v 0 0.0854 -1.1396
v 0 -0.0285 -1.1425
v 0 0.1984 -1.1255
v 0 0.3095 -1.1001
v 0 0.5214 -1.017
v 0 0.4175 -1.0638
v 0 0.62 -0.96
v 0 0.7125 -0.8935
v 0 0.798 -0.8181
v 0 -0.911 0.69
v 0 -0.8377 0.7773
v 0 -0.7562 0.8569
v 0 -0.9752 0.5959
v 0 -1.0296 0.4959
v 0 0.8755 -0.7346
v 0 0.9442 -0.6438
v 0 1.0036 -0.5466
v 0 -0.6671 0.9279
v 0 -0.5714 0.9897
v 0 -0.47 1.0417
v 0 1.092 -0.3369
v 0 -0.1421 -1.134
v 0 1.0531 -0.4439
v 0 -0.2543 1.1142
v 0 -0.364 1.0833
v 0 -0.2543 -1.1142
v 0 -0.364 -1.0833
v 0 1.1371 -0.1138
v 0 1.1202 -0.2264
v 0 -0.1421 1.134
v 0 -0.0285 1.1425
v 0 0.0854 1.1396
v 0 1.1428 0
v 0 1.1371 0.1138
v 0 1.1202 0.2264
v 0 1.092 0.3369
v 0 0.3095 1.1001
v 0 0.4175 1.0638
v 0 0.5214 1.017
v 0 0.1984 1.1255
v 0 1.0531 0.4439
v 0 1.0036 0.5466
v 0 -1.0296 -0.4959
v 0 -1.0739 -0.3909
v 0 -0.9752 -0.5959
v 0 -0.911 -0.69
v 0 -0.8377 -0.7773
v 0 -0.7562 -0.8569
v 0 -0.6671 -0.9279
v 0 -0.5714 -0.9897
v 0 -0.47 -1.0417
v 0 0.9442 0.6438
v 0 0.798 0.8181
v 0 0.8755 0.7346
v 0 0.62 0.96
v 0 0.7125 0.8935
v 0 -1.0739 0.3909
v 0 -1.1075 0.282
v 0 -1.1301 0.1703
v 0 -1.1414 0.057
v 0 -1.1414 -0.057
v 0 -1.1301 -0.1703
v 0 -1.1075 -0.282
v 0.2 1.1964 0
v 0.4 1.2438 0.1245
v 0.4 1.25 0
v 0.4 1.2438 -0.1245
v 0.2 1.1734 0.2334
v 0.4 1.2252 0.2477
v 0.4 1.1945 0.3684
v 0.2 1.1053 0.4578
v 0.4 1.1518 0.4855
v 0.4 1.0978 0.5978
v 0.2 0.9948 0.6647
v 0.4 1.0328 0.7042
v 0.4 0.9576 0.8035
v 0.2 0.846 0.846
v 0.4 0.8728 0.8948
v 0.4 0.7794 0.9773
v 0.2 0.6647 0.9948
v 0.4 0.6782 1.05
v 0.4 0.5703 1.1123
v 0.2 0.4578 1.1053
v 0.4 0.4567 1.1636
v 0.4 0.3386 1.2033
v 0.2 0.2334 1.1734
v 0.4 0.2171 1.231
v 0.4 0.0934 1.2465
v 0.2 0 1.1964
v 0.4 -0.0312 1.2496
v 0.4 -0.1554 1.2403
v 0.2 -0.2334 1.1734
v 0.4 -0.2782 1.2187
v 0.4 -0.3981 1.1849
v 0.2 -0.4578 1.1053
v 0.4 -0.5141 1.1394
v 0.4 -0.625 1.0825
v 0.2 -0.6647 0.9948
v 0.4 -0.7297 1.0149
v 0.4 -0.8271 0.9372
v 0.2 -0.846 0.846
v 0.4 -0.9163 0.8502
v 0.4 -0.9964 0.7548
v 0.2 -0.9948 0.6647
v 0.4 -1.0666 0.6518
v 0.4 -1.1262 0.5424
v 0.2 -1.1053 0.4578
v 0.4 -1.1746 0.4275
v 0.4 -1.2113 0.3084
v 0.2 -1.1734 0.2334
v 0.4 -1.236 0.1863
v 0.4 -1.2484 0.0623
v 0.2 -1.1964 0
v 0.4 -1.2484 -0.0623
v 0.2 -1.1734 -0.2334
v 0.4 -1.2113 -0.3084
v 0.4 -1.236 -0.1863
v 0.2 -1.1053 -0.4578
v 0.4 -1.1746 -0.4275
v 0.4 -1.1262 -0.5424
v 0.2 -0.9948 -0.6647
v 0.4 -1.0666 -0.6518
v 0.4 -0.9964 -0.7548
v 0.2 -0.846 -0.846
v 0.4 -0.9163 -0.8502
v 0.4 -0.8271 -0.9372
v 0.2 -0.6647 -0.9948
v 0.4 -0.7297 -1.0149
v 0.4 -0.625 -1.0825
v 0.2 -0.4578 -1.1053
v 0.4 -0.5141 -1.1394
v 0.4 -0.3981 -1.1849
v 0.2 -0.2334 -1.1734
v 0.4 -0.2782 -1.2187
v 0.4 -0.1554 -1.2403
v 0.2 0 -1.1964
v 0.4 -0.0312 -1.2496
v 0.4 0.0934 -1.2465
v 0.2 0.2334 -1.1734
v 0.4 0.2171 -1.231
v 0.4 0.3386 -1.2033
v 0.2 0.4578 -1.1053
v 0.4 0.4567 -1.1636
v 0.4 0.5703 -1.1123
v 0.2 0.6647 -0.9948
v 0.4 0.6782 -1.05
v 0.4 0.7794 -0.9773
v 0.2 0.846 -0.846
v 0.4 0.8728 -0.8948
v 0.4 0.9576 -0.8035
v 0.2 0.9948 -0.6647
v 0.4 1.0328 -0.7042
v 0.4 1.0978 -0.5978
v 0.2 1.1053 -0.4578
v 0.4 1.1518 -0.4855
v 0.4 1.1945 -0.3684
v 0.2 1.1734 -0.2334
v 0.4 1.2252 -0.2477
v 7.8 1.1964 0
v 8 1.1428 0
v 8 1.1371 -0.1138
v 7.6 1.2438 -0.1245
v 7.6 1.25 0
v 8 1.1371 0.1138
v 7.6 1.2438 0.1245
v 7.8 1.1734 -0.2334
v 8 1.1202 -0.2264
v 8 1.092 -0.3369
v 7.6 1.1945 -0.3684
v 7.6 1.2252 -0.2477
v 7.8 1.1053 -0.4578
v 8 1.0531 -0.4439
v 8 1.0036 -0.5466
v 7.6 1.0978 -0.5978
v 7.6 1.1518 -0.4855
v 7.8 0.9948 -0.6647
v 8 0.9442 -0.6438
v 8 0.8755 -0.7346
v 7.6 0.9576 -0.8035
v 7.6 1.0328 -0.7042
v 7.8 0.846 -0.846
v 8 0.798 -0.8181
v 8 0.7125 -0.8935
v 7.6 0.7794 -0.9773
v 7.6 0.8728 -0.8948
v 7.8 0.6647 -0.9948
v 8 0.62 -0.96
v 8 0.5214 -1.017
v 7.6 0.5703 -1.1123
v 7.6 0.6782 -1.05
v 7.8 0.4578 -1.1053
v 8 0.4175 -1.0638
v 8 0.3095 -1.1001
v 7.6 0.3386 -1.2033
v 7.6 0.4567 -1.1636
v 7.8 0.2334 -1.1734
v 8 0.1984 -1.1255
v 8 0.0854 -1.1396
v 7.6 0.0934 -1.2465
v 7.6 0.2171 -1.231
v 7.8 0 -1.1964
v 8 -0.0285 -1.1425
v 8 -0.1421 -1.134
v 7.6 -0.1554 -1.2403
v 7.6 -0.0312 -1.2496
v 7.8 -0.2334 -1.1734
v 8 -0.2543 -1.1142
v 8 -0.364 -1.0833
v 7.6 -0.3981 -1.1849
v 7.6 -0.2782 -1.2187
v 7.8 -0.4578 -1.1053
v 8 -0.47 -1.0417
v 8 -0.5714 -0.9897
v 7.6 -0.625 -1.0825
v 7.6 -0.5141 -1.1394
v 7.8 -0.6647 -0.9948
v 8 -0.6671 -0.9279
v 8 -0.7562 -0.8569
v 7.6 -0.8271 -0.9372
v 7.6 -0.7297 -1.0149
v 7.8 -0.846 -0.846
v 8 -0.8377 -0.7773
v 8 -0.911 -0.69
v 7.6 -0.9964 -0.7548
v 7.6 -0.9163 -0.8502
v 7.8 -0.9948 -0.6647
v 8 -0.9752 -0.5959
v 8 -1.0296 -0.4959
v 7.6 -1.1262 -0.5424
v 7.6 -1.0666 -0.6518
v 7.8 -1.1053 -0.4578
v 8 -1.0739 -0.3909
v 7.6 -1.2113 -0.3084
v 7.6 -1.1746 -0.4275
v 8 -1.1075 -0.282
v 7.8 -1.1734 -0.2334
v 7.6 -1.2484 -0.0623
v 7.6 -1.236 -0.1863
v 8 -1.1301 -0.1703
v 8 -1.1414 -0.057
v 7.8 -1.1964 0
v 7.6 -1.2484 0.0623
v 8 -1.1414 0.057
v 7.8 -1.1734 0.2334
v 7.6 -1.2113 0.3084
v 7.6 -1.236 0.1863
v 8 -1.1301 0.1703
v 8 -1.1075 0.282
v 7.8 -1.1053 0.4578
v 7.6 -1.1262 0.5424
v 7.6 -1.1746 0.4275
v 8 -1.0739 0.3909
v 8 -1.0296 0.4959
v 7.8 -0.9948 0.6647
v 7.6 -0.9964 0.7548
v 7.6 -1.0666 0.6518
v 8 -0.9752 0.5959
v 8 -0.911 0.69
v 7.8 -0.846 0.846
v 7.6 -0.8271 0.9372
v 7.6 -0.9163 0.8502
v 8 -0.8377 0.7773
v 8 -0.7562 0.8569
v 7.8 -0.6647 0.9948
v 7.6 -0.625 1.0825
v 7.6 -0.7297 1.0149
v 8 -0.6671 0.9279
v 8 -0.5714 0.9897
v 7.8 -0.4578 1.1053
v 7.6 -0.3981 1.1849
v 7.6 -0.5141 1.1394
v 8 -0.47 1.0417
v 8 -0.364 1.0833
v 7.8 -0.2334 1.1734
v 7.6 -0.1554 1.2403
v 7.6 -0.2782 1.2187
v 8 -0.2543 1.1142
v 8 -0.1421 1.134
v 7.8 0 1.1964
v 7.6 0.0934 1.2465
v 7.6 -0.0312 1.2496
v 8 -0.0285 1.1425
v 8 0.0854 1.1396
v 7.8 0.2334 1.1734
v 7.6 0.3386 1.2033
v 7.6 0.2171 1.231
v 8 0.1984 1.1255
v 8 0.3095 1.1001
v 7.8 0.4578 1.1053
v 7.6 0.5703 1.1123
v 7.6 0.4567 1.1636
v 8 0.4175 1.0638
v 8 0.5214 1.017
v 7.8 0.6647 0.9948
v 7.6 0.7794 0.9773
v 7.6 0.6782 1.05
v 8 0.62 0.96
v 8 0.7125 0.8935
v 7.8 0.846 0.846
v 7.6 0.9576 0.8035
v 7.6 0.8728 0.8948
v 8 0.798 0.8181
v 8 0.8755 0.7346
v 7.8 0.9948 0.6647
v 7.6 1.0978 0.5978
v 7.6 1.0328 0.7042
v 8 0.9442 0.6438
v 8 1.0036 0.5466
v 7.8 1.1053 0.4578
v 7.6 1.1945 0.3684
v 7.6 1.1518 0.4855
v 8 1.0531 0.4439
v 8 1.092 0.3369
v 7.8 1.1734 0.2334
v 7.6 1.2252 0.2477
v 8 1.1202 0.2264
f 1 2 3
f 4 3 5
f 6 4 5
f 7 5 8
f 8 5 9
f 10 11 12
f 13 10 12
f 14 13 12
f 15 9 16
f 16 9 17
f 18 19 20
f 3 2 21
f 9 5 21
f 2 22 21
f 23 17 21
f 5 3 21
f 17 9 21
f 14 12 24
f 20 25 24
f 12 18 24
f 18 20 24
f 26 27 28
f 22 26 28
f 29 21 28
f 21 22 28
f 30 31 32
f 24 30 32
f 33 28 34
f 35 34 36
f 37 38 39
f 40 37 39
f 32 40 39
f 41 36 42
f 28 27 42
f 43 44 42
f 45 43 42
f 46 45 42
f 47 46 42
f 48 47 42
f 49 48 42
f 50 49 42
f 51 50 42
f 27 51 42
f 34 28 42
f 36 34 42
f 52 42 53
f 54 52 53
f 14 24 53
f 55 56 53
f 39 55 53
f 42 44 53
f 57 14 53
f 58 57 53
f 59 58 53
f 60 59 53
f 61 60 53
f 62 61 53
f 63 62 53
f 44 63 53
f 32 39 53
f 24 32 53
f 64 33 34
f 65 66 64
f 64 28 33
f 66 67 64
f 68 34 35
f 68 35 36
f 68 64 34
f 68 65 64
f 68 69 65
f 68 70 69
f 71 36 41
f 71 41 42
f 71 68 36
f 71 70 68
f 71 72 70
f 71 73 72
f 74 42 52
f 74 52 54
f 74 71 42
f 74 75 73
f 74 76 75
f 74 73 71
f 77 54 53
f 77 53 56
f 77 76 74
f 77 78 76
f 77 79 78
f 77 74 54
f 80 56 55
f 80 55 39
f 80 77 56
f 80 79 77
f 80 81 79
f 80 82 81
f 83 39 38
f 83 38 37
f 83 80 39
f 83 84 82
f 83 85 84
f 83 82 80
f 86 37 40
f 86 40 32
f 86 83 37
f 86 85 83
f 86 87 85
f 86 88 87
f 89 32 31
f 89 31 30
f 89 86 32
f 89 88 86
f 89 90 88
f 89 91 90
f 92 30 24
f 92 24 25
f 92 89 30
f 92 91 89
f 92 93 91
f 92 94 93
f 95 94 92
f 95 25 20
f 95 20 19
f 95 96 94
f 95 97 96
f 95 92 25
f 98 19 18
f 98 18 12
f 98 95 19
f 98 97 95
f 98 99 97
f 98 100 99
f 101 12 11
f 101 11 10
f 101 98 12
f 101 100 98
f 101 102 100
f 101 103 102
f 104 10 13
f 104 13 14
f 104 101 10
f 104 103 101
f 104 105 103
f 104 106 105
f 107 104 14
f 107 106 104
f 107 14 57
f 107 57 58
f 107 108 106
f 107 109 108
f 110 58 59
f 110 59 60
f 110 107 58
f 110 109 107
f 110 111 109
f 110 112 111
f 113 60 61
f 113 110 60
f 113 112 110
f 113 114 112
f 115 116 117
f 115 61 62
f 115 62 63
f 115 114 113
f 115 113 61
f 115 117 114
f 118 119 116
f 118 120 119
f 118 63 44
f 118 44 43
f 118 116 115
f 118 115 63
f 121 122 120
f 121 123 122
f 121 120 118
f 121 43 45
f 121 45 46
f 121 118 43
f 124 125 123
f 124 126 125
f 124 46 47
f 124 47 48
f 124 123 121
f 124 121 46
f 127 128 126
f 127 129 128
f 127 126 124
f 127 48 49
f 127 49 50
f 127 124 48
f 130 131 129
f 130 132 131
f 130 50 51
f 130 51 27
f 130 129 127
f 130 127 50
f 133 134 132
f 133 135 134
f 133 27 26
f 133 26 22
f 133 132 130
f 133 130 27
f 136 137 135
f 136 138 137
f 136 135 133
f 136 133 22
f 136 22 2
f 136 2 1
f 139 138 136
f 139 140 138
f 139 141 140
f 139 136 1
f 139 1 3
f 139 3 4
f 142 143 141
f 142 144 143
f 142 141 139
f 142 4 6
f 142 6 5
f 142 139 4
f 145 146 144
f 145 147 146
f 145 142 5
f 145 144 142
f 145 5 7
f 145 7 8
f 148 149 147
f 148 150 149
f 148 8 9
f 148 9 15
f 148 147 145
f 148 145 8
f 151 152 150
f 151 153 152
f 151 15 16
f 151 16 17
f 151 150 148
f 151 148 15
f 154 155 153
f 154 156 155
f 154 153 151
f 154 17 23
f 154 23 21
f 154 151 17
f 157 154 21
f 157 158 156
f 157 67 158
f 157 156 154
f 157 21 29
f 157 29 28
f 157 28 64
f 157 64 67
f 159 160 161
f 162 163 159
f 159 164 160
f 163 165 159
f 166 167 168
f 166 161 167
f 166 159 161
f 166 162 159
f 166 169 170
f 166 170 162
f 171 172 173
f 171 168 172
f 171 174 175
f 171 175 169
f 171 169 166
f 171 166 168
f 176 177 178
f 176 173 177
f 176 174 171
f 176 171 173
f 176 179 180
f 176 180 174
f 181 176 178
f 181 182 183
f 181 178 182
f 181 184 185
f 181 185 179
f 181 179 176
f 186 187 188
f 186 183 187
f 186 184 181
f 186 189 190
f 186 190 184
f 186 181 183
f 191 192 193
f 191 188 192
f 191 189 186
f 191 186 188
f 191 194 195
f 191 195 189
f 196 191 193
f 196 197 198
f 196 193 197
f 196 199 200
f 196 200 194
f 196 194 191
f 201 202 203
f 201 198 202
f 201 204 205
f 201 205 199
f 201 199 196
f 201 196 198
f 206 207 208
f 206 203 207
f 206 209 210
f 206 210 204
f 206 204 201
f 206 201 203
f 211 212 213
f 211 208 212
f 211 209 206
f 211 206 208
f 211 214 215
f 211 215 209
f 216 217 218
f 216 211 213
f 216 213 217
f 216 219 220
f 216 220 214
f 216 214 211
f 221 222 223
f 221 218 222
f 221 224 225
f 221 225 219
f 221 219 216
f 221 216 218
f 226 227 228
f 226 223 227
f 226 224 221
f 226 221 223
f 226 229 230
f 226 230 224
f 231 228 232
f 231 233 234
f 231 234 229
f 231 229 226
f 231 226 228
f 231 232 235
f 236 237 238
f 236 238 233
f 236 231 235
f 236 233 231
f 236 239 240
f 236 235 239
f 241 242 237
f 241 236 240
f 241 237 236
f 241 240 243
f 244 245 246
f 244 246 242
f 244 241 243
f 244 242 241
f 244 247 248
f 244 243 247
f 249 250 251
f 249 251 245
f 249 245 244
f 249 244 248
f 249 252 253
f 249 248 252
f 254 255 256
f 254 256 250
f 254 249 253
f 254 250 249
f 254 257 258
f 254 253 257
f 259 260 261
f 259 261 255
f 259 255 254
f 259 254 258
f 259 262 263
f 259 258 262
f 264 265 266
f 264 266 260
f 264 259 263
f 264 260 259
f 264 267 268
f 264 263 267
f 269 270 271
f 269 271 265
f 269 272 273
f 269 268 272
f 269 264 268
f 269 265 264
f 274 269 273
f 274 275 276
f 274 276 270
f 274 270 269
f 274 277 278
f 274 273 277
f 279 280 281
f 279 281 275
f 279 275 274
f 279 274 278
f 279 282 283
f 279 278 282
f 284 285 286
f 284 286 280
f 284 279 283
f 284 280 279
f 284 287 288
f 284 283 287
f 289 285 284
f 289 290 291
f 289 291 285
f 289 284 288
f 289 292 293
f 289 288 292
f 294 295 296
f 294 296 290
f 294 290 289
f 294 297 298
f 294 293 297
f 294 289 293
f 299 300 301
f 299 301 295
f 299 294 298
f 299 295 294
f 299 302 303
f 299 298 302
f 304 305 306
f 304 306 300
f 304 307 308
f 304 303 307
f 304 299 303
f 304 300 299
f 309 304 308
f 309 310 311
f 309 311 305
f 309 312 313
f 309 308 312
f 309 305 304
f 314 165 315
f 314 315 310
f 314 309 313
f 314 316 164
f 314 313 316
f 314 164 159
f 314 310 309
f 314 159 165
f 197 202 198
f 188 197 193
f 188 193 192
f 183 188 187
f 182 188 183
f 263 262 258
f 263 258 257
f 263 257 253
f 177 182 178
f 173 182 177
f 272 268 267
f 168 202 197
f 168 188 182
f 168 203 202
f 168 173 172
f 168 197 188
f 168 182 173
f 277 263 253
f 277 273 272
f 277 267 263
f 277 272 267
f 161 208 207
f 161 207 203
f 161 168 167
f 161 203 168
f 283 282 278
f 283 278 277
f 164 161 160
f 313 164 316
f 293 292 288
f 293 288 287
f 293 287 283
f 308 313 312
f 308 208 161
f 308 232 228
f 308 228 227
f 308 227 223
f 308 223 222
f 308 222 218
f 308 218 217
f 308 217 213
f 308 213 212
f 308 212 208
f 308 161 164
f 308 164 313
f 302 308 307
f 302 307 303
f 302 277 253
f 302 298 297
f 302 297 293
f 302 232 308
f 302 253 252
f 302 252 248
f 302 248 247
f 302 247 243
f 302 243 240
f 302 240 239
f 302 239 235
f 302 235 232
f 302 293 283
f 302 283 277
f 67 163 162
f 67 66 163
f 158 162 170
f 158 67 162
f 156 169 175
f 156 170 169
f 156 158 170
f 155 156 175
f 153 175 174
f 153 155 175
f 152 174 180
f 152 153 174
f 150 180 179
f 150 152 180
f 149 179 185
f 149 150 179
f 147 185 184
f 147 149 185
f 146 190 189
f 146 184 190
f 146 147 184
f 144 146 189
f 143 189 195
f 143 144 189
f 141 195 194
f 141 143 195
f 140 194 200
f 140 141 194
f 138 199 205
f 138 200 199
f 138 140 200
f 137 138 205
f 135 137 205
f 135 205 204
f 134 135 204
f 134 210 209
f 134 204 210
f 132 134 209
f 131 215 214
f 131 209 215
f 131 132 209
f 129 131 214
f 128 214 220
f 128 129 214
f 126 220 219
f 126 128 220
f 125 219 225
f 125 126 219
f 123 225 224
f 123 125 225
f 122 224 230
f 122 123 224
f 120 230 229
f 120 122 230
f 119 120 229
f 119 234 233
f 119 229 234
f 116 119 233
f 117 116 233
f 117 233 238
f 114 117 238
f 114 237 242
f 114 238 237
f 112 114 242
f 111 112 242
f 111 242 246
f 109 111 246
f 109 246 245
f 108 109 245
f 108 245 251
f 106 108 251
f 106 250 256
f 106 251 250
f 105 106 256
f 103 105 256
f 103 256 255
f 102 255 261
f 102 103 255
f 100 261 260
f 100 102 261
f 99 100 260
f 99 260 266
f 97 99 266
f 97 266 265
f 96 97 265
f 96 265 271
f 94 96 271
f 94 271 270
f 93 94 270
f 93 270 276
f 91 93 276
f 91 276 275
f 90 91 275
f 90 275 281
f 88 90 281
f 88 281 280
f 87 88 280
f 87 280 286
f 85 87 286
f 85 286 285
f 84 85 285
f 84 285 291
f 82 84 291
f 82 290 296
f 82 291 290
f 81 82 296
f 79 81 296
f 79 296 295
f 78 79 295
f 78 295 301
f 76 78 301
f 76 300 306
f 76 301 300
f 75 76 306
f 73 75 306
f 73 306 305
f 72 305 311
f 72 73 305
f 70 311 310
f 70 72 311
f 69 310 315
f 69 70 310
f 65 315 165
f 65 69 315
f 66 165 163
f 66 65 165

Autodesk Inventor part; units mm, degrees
ref_plane "YZ Plane" through (0, 0, 0) normal (1, 0, 0) x (0, 1, 0)
ref_plane "XZ Plane" through (0, 0, 0) normal (0, 1, 0) x (-1, 0, 0)
ref_plane "XY Plane" through (0, 0, 0) normal (0, 0, 1) x (1, 0, 0)
sketch "Skizze" plane through (0, 0, 0) normal (1, 0, 0) x (0, 1, 0)
  circle A0 centre (0, 0) radius 1.25
  dimension "d1" = 2.5
extrude "Körper" add sketch "Skizze" along normal blind 8
chamfer "Fase1" distance 0.4 angle 15 1 edges at (0, -1.25, 0) measured on face at (5.3333, 1.2459, -0.1006)
chamfer "Skizze2" distance 0.4 angle 15 1 edges at (8, -1.25, 0) measured on face at (5.4667, 1.2459, -0.1006)
equation "\"d1\" = NND"
equation "\"d2\" = NLG"
equation "\"d8\" = PHH"
equation "\"d9\" = FAWI"
equation "\"d12\" = PHH"
equation "\"d4\" = PHH"
equation "\"d5\" = FAWI"
equation "\"d11\" = PHH"
equation "\"NND\" = 2.5"
equation "\"NLG\" = 8"
equation "\"PHH\" = 0.4"
equation "\"FAWI\" = 15deg"
equation "\"KAH\" = 0"
properties part number "ISO 2338 - 2,5 m6 x 8" material "Edelstahl, austenitisch"
